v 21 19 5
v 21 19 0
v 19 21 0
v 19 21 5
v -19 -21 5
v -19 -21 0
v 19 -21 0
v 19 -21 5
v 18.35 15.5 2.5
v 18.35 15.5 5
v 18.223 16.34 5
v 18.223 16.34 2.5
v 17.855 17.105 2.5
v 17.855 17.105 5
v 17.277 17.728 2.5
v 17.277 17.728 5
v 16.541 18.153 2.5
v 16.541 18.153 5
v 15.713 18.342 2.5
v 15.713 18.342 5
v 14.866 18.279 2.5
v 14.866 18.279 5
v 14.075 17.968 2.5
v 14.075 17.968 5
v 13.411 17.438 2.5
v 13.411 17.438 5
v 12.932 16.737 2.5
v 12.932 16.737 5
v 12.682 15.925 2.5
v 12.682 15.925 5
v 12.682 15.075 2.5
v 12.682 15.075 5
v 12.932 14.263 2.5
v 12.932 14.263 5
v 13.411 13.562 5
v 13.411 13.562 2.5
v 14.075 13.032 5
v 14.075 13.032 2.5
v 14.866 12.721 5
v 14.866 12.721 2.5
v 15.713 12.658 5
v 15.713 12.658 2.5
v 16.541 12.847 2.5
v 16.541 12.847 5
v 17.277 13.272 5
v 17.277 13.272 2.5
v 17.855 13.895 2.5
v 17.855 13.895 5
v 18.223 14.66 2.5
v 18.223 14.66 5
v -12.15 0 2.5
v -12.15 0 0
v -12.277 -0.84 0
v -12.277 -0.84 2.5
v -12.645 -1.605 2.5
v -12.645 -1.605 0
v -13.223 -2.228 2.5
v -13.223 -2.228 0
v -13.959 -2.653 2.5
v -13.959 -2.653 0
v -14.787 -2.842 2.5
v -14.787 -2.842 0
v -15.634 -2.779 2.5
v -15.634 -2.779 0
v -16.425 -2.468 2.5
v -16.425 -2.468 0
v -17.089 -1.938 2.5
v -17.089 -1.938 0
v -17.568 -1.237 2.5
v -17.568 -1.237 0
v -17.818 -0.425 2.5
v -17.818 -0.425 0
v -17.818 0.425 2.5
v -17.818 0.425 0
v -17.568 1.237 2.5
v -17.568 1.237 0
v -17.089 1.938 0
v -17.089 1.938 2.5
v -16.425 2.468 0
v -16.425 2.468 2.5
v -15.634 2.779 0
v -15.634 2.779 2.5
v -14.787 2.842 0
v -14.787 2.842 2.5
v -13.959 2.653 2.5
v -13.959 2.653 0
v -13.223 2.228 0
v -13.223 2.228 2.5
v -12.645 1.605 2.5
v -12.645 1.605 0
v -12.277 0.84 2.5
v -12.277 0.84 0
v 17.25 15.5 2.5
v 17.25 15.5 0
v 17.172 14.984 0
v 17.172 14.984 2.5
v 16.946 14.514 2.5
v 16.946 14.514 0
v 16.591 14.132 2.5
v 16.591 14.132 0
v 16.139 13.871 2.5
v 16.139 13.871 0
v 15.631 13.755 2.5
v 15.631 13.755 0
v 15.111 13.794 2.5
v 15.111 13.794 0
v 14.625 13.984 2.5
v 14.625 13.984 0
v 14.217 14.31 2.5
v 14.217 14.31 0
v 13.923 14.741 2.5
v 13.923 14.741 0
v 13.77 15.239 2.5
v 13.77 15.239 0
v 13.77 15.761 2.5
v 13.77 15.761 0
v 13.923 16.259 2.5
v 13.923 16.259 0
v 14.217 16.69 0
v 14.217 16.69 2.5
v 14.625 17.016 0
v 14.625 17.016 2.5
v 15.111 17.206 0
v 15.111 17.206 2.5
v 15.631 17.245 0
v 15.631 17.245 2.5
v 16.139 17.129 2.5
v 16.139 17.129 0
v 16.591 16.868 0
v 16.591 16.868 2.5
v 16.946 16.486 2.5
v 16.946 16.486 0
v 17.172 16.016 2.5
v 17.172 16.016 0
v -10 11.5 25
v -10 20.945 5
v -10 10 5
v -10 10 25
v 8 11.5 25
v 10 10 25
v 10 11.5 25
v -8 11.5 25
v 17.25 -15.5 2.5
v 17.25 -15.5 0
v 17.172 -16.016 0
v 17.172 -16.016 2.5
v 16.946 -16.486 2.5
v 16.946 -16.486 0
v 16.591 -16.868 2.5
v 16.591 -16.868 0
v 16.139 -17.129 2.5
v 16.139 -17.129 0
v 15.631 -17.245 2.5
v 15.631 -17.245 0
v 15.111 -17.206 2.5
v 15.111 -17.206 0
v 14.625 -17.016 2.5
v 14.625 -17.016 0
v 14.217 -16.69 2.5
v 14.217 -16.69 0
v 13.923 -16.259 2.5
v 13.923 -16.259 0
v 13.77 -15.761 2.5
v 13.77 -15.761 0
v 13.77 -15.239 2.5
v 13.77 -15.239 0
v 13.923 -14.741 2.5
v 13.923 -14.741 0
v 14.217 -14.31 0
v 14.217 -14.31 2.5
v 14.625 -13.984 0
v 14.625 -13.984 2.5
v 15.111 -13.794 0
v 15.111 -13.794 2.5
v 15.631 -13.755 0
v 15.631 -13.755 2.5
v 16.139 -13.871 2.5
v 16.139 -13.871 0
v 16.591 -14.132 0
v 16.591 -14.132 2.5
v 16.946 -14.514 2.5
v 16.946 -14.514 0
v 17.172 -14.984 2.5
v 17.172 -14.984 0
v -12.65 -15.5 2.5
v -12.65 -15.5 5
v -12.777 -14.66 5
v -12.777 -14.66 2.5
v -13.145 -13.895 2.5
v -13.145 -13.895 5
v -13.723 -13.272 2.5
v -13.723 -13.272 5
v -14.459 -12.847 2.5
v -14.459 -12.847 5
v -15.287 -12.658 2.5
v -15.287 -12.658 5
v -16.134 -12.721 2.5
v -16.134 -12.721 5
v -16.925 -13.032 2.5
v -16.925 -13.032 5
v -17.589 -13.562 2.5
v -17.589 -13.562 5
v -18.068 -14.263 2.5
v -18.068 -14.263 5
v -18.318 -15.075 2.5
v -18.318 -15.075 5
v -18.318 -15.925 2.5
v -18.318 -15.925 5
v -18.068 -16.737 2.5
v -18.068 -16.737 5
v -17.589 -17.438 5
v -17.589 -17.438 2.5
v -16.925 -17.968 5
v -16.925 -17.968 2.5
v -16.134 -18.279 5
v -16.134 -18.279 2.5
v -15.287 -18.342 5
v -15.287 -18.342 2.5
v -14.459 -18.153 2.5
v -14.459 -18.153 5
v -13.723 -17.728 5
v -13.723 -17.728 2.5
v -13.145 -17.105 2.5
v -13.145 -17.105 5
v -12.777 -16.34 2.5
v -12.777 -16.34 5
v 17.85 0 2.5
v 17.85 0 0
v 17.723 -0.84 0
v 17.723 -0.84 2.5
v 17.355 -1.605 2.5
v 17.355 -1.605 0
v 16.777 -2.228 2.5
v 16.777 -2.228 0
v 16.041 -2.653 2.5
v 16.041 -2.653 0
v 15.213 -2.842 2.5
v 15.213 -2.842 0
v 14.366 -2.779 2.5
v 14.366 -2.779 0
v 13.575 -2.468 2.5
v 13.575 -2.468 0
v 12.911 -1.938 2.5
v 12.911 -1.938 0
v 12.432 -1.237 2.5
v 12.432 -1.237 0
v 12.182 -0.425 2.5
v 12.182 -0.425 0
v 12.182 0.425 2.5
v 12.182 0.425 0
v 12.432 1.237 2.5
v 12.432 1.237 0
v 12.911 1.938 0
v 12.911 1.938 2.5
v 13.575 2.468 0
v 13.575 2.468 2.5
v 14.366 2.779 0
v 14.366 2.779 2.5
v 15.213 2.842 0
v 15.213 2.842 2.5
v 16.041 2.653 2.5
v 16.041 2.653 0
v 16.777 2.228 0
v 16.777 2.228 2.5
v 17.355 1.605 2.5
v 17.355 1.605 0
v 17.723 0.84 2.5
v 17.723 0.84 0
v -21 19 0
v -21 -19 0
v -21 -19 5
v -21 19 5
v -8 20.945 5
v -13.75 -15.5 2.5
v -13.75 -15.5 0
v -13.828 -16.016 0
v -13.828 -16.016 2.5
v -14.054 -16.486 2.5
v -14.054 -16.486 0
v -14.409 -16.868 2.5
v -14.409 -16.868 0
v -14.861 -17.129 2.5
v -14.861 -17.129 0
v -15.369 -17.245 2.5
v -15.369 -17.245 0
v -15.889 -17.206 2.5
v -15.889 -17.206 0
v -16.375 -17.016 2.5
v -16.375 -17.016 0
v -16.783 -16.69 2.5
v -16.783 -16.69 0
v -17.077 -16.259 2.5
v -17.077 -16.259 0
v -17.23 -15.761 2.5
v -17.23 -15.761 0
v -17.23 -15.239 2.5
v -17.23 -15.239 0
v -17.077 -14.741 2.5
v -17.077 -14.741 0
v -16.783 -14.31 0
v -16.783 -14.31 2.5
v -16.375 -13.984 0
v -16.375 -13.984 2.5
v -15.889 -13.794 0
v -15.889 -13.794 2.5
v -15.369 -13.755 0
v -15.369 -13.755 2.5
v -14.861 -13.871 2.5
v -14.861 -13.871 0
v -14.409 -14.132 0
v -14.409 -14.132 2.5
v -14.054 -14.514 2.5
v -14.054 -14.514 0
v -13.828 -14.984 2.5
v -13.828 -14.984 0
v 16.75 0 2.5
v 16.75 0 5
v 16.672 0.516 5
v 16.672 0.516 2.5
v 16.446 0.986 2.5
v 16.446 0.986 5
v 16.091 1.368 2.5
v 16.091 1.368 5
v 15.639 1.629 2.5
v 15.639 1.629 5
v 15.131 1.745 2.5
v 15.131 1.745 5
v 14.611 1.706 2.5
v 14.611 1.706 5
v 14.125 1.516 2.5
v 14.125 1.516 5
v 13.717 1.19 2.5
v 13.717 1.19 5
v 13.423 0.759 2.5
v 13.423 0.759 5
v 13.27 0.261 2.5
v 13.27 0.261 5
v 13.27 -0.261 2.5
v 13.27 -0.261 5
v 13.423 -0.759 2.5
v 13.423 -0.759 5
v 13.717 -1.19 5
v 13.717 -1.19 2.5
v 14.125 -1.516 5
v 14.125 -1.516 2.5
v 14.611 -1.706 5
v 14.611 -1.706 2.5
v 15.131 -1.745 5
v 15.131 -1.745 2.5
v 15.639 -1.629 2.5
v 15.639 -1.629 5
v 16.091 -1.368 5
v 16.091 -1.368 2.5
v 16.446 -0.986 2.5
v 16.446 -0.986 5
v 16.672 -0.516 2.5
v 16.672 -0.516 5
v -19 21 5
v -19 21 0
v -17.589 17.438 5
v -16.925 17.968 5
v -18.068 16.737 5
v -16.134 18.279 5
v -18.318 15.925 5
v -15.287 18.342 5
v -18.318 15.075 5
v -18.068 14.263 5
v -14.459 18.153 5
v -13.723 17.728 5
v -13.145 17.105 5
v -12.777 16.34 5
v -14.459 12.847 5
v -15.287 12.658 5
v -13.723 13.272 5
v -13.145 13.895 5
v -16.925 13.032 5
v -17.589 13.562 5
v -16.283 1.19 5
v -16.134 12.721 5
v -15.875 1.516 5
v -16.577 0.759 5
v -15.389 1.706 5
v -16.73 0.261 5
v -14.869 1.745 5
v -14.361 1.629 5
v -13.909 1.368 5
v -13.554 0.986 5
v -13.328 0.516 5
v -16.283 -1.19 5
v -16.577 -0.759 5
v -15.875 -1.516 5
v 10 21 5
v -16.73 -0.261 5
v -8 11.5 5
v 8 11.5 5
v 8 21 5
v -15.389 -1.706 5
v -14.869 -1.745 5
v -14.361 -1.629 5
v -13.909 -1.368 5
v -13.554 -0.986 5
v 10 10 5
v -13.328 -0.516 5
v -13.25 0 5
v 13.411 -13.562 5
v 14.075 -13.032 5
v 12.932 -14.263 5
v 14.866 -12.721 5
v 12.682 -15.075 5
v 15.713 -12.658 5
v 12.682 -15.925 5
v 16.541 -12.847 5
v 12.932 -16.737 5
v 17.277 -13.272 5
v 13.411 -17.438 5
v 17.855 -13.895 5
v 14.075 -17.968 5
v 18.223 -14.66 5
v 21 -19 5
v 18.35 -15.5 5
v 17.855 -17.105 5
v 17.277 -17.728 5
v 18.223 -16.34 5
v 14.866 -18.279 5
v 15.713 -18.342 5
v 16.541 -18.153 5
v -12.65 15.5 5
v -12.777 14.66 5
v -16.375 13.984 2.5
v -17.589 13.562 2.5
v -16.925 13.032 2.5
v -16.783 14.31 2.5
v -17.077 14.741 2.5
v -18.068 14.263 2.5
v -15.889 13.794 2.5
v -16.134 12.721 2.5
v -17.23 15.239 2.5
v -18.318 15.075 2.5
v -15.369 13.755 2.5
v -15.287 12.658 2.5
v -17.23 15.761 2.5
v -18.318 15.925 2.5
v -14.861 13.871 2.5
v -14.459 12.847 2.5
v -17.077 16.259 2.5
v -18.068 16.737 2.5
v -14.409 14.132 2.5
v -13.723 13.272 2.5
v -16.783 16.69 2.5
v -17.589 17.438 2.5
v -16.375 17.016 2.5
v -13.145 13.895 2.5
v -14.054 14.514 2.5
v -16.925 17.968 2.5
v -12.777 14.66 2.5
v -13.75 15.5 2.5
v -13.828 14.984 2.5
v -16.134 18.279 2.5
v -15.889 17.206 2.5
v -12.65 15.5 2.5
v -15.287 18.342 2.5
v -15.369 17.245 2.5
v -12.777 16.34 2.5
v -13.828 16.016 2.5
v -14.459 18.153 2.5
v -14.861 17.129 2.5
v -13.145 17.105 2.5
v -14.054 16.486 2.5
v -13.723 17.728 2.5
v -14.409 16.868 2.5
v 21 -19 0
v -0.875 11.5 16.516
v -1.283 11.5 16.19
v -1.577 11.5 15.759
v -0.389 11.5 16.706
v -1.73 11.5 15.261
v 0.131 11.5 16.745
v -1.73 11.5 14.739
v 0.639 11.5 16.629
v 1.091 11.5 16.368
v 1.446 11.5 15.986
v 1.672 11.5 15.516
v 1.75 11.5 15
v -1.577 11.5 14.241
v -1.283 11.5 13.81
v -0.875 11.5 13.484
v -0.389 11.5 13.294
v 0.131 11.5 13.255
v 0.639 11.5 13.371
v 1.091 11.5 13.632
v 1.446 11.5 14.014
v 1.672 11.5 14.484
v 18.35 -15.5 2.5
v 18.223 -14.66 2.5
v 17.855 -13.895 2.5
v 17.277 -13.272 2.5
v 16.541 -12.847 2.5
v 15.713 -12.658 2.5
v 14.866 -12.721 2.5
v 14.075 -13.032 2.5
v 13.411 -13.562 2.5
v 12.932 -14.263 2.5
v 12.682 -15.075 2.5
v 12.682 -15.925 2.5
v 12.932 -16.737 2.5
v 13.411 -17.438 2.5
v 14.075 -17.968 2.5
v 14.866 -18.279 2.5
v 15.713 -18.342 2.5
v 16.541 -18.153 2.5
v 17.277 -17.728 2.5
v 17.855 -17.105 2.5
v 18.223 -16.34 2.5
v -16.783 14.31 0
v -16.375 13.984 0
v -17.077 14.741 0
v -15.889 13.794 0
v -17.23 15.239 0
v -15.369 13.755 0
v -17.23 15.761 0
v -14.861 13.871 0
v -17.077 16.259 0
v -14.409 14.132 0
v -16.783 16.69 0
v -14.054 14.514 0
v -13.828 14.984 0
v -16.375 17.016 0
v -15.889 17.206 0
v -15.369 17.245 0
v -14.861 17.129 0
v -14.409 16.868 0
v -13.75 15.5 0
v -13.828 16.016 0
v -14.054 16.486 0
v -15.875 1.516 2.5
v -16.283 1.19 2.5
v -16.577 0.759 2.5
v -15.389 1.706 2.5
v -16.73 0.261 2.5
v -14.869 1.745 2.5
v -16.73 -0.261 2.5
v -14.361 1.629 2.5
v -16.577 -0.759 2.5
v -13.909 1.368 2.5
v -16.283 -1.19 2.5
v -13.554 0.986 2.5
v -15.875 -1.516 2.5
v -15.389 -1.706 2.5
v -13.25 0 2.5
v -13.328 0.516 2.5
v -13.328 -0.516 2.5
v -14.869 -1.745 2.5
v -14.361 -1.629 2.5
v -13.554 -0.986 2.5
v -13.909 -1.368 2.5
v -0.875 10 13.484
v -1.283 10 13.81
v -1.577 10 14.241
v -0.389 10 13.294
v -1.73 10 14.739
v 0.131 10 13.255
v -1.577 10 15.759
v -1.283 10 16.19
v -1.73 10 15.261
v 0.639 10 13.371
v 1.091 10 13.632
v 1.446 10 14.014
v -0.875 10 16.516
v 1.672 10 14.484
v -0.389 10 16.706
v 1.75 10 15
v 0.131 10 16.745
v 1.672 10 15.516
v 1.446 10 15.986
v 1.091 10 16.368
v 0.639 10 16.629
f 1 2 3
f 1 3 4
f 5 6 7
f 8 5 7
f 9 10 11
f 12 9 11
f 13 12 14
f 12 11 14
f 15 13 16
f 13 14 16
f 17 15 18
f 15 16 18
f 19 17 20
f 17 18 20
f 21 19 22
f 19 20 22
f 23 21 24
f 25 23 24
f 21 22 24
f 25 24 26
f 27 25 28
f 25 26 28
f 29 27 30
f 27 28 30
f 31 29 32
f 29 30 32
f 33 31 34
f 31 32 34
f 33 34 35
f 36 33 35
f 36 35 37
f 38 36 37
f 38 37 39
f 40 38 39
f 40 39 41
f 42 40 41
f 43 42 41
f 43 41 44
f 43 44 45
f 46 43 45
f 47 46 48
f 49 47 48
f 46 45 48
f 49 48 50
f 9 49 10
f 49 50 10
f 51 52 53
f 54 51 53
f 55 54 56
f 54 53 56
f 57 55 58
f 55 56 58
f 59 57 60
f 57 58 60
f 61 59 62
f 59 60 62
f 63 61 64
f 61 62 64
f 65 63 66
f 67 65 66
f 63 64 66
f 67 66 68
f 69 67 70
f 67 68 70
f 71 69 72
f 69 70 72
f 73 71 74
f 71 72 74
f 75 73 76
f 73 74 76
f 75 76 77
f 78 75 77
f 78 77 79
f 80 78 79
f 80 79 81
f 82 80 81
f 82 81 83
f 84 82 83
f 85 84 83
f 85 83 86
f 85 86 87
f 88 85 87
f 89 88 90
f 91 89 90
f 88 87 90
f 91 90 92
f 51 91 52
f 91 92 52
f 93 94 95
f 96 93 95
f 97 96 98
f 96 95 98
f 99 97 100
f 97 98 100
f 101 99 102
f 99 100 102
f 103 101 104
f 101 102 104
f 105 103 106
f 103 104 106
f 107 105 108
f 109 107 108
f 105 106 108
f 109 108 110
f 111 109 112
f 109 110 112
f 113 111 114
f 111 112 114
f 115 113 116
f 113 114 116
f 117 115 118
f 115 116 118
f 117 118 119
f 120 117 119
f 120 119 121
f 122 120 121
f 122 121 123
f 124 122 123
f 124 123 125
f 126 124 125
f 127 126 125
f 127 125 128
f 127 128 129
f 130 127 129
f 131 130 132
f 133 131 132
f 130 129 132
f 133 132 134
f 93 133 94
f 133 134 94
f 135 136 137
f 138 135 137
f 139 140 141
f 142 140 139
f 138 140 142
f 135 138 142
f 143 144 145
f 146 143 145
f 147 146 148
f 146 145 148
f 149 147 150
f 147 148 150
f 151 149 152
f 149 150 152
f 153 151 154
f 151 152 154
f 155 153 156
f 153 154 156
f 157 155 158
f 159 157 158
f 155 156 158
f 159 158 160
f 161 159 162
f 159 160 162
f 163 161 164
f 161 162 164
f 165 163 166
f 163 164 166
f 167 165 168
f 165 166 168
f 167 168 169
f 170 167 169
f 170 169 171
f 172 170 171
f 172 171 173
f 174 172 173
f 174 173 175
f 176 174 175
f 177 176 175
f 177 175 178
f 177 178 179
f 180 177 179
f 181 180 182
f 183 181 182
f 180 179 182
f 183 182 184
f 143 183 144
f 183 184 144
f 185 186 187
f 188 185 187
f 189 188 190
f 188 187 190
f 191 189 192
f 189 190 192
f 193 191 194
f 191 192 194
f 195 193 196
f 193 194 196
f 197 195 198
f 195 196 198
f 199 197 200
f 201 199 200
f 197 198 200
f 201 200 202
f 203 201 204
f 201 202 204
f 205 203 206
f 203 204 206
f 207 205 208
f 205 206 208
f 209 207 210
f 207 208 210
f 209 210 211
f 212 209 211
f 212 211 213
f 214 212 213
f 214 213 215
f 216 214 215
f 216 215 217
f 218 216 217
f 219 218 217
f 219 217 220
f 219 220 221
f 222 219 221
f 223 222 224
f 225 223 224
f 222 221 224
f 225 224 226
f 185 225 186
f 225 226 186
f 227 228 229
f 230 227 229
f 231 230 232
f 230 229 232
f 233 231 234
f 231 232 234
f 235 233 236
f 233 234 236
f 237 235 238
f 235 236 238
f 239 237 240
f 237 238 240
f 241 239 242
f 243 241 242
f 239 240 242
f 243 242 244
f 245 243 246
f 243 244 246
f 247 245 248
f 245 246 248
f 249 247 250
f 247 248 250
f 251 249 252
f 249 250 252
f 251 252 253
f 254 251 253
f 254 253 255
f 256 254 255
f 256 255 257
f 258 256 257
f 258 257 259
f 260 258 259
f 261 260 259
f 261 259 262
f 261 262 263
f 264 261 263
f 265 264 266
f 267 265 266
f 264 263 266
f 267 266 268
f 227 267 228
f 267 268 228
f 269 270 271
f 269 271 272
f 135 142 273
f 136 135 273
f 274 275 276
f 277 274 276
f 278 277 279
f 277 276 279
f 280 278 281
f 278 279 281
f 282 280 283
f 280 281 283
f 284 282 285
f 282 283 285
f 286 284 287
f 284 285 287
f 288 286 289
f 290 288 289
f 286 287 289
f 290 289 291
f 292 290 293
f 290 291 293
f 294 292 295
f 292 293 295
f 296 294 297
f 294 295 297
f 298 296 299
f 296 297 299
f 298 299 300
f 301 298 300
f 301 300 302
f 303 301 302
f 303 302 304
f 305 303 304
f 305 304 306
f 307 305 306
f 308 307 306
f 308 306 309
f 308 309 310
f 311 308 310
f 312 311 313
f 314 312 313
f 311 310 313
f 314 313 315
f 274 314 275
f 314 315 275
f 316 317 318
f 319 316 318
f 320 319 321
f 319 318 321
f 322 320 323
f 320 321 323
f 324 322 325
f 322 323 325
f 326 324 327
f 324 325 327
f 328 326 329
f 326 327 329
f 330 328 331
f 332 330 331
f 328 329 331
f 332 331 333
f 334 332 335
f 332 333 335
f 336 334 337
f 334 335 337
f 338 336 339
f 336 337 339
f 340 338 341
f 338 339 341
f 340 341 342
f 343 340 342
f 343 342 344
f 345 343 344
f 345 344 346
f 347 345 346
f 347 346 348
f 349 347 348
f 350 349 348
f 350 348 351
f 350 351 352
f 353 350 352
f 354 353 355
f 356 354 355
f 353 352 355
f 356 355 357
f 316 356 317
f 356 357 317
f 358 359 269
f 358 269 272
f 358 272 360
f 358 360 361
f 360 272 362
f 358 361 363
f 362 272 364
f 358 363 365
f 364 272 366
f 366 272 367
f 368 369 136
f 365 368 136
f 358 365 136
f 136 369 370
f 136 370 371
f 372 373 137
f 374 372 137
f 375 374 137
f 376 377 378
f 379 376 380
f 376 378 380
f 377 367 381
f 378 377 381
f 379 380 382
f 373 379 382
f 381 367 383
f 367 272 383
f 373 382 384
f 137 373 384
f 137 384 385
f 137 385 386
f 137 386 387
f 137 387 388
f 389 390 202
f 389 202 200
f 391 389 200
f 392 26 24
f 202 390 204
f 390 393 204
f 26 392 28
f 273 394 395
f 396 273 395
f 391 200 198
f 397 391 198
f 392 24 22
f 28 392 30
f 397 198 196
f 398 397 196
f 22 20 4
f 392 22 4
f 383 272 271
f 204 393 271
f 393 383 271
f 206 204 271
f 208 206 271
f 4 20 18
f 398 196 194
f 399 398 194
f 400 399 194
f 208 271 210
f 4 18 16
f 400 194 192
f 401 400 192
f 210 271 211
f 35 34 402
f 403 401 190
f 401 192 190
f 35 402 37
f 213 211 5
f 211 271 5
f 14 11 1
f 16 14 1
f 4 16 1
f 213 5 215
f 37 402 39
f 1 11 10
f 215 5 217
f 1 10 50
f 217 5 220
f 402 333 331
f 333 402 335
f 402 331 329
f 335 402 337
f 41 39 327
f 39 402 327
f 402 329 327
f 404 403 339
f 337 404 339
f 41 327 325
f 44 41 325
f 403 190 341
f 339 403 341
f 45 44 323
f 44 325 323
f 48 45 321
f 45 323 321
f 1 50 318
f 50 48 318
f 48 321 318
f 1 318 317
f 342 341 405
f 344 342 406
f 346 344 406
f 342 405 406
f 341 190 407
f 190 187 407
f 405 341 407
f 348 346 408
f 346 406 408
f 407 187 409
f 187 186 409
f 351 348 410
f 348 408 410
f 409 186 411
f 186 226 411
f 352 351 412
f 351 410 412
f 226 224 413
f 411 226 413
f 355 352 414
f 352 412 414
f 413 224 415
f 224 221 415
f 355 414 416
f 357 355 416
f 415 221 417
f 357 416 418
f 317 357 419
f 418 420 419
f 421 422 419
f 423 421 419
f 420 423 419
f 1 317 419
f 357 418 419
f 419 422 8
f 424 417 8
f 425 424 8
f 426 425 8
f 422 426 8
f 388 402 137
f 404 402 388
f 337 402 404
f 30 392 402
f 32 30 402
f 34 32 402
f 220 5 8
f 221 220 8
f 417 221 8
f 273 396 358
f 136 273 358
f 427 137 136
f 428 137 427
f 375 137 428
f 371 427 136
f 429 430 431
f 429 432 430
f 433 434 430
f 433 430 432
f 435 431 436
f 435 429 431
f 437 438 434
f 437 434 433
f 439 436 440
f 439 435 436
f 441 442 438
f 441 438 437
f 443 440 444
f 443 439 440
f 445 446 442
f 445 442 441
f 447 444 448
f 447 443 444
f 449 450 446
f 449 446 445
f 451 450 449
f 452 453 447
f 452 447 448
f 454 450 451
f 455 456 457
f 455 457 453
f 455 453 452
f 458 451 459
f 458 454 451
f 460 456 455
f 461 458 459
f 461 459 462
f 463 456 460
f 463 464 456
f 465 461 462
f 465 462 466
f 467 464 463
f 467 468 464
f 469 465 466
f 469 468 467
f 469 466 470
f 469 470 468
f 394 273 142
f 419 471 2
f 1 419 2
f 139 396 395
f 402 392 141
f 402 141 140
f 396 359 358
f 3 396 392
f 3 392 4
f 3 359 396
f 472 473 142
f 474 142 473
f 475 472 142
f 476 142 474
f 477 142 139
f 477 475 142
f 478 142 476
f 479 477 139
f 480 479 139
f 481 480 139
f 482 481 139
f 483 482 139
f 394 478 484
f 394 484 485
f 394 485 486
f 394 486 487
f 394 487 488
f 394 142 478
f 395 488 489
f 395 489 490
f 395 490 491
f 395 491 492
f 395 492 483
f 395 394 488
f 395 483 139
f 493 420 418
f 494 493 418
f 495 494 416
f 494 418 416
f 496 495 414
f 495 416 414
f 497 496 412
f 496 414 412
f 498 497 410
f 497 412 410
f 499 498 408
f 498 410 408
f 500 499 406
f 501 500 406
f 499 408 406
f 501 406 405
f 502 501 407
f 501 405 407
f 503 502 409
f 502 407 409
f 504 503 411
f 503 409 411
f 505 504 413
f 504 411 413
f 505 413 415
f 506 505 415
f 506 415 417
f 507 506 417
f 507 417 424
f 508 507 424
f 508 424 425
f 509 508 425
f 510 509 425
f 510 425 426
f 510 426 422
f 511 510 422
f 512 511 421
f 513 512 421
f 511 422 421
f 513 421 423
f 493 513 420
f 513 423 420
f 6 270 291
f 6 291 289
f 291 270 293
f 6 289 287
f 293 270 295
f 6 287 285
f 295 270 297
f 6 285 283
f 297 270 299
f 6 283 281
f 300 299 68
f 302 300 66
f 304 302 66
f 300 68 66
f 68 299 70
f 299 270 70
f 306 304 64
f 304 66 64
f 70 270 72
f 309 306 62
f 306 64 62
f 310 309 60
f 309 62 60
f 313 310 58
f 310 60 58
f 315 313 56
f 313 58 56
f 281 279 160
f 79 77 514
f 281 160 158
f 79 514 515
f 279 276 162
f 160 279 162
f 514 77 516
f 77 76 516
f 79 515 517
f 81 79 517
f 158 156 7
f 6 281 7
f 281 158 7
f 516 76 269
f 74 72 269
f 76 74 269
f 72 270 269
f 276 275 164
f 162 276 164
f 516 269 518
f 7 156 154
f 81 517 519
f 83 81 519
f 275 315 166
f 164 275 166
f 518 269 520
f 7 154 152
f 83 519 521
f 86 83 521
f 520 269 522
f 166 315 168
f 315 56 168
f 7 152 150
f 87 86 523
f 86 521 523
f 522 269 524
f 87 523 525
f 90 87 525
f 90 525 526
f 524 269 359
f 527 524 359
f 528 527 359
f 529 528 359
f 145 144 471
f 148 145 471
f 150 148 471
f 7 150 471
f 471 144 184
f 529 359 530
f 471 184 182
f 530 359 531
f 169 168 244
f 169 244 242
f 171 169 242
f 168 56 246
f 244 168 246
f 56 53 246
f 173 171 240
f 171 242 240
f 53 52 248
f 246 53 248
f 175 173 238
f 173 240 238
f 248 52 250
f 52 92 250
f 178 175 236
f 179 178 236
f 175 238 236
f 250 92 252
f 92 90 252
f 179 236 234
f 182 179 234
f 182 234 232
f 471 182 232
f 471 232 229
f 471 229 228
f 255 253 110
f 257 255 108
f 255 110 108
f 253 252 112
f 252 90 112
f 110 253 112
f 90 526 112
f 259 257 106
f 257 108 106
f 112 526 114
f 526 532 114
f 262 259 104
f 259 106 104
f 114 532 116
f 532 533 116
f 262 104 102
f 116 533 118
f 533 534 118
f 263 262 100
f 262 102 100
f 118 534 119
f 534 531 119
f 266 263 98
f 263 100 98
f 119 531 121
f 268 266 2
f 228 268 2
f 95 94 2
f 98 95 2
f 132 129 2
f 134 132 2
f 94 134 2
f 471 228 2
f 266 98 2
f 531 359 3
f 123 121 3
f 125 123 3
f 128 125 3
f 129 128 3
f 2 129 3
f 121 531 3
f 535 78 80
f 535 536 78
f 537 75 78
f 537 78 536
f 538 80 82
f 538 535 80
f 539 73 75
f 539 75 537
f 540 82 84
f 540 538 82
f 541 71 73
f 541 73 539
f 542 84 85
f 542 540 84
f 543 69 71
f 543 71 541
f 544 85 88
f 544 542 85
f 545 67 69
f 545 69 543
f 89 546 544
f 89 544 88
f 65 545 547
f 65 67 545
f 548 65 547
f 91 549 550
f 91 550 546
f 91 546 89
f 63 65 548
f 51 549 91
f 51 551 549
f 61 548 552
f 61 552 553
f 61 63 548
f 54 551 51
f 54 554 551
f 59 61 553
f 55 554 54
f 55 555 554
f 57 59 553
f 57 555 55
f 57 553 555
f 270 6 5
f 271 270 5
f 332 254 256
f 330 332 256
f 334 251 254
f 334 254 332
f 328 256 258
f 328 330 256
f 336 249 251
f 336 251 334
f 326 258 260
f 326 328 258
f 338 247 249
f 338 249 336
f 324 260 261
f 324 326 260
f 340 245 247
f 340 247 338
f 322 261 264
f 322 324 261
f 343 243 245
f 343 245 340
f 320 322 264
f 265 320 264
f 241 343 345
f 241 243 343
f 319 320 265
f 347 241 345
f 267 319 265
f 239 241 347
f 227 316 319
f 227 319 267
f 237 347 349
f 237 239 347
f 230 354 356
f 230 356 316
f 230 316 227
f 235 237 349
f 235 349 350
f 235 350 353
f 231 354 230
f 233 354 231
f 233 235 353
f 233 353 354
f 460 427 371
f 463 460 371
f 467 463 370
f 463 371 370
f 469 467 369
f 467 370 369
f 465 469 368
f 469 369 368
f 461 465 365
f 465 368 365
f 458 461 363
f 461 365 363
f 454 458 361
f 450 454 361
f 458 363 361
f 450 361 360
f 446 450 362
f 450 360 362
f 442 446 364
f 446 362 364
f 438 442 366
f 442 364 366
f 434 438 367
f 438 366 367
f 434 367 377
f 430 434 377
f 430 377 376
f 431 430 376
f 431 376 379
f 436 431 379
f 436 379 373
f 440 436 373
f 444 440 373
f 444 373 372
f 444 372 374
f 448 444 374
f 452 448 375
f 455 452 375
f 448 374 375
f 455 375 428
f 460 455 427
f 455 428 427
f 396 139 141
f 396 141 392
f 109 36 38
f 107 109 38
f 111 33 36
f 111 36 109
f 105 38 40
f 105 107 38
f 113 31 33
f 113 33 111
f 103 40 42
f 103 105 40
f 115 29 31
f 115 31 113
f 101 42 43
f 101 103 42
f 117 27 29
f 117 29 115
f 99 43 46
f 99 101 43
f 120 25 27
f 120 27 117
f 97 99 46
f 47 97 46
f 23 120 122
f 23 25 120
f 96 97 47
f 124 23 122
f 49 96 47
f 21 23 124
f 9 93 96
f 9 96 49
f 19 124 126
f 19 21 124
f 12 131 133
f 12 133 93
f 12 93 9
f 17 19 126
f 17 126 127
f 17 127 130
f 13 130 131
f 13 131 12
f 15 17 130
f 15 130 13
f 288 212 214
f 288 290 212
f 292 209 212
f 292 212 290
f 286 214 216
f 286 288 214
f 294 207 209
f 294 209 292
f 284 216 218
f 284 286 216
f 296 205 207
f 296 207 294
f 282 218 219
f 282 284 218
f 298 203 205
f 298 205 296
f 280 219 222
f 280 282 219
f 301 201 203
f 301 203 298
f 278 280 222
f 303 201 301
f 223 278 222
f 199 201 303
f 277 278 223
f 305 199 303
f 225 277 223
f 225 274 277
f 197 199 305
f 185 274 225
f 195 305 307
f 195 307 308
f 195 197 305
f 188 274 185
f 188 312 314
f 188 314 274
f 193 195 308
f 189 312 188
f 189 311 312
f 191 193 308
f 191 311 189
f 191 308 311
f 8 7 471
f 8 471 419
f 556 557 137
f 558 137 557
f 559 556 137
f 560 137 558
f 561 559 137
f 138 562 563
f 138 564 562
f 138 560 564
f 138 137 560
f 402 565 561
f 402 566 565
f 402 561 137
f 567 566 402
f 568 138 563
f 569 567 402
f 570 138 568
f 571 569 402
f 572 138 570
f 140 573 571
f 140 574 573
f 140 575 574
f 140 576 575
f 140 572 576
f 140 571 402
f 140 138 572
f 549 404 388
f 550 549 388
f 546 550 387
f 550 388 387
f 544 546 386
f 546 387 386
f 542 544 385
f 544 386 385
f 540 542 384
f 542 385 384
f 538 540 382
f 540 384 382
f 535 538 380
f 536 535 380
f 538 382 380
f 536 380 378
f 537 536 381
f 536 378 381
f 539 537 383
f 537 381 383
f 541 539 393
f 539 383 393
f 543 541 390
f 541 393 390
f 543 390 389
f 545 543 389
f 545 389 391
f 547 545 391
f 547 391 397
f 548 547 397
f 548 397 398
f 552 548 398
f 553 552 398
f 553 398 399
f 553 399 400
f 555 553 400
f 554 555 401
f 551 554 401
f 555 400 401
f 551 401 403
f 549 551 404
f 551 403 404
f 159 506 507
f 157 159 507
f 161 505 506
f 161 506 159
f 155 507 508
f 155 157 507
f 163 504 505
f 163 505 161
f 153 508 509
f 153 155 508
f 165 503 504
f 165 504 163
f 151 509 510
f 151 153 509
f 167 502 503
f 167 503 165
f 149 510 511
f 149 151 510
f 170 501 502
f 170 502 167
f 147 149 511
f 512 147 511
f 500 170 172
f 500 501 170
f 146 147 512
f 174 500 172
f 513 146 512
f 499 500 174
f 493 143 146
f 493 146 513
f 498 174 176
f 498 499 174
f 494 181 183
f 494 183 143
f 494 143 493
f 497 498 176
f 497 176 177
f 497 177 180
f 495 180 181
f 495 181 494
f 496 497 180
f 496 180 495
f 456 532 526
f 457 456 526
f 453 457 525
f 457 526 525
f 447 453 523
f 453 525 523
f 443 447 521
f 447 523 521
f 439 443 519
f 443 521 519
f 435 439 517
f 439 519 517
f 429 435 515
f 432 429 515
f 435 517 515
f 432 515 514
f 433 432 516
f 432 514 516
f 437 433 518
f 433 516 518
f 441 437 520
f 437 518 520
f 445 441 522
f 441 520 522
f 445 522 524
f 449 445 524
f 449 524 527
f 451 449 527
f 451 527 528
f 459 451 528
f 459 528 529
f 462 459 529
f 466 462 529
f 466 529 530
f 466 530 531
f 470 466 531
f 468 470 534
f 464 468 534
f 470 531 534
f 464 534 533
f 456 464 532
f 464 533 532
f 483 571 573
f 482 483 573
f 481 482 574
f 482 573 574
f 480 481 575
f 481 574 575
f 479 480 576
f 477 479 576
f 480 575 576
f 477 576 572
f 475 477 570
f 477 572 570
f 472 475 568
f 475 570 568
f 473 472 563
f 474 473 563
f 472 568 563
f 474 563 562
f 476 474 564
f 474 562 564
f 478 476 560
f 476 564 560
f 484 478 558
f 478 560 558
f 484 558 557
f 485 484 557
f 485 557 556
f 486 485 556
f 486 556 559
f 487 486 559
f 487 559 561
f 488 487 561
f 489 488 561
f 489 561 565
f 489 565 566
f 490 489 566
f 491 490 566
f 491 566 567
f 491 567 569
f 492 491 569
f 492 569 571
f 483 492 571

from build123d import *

# Parameters (mm, degrees)
BOX_W           = 42
BOX_H           = 42
BOX_DEPTH       = 5
SKETCH_R        = 2.75
POCKET_DEPTH    = 2.5
SKETCH001_R     = 1.55
POCKET001_DEPTH = 5
SKETCH002_R     = 2.75
POCKET002_DEPTH = 2.5
SKETCH003_R     = 1.55
POCKET003_DEPTH = 5
CHAMFER_SIZE    = 2
CHAMFER001_SIZE = 2
CHAMFER002_SIZE = 2
CHAMFER003_SIZE = 2
SKETCH004_W     = 16
SKETCH004_H     = 2.5
PAD_DEPTH       = 20
PAD001_DEPTH    = 2
PAD002_DEPTH    = 2
SKETCH007_R     = 1.55
POCKET004_DEPTH = 5
SKETCH008_W     = 20
SKETCH008_H     = 20
POCKET005_DEPTH = 1
SKETCH010_R     = 2.85
SKETCH010_R_2   = 1.75
POCKET006_DEPTH = 2.5
SKETCH011_R     = 1.75
SKETCH011_R_2   = 2.85
POCKET007_DEPTH = 2.5
SKETCH012_R     = 1.75
POCKET008_DEPTH = 5


with BuildPart() as part:
    # Box → Box (new body)
    with BuildSketch(Plane(origin=(-21, -21, 0), x_dir=(1, 0, 0), z_dir=(0, 0, 1))):
        with Locations((21, 21)):
            Rectangle(BOX_W, BOX_H)
    extrude(amount=BOX_DEPTH)

    # Sketch → Pocket (cut)
    with BuildSketch(Plane(origin=(-21, -21, 5), x_dir=(1, 0, 0), z_dir=(0, 0, 1))):
        with Locations((5.5, 5.5)):
            Circle(SKETCH_R)
        with Locations((36.5, 5.5)):
            Circle(SKETCH_R)
        with Locations((36.5, 36.5)):
            Circle(SKETCH_R)
        with Locations((5.5, 36.5)):
            Circle(SKETCH_R)
    extrude(amount=-POCKET_DEPTH, mode=Mode.SUBTRACT)

    # Sketch001 → Pocket001 (cut)
    with BuildSketch(Plane(origin=(-21, -21, 0), x_dir=(1, 0, 0), z_dir=(0, 0, -1))):
        with Locations((5.5, -5.5)):
            Circle(SKETCH001_R)
        with Locations((36.5, -5.5)):
            Circle(SKETCH001_R)
        with Locations((36.5, -36.5)):
            Circle(SKETCH001_R)
        with Locations((5.5, -36.5)):
            Circle(SKETCH001_R)
    extrude(amount=-POCKET001_DEPTH, mode=Mode.SUBTRACT)

    # Sketch002 → Pocket002 (cut)
    with BuildSketch(Plane(origin=(-21, -21, 0), x_dir=(1, 0, 0), z_dir=(0, 0, -1))):
        with Locations((6, -21)):
            Circle(SKETCH002_R)
        with Locations((36, -21)):
            Circle(SKETCH002_R)
    extrude(amount=-POCKET002_DEPTH, mode=Mode.SUBTRACT)

    # Sketch003 → Pocket003 (cut)
    with BuildSketch(Plane(origin=(-21, -21, 5), x_dir=(1, 0, 0), z_dir=(0, 0, 1))):
        with Locations((6, 21)):
            Circle(SKETCH003_R)
        with Locations((36, 21)):
            Circle(SKETCH003_R)
    extrude(amount=-POCKET003_DEPTH, mode=Mode.SUBTRACT)

    # Chamfer
    chamfer_edges = [part.edges().sort_by_distance(p)[0] for p in [
        (-21, -21, 2.5),
    ]]
    chamfer(chamfer_edges, length=CHAMFER_SIZE)

    # Chamfer001
    chamfer001_edges = [part.edges().sort_by_distance(p)[0] for p in [
        (-21, 21, 2.5),
    ]]
    chamfer(chamfer001_edges, length=CHAMFER001_SIZE)

    # Chamfer002
    chamfer002_edges = [part.edges().sort_by_distance(p)[0] for p in [
        (21, 21, 2.5),
    ]]
    chamfer(chamfer002_edges, length=CHAMFER002_SIZE)

    # Chamfer003
    chamfer003_edges = [part.edges().sort_by_distance(p)[0] for p in [
        (21, -21, 2.5),
    ]]
    chamfer(chamfer003_edges, length=CHAMFER003_SIZE)

    # Sketch004 → Pad (new body)
    with BuildSketch(Plane(origin=(-21, -21, 5), x_dir=(1, 0, 0), z_dir=(0, 0, 1))):
        with Locations((21, 31.25)):
            Rectangle(SKETCH004_W, SKETCH004_H)
    extrude(amount=PAD_DEPTH)

    # Sketch005 → Pad001 (new body)
    with BuildSketch(Plane(origin=(-8, -21, 0), x_dir=(0, -1, 0), z_dir=(-1, 0, 0))):
        Polygon((-30, 25), (-32.5, 25), (-41.94515, 5), (-30, 5), align=None)
    extrude(amount=PAD001_DEPTH)

    # Sketch006 → Pad002 (new body)
    with BuildSketch(Plane(origin=(8, -21, 0), x_dir=(0, 1, 0), z_dir=(1, 0, 0))):
        Polygon((30, 25), (32.5, 25), (42, 5), (30, 5), align=None)
    extrude(amount=PAD002_DEPTH)

    # Sketch007 → Pocket004 (cut)
    with BuildSketch(Plane(origin=(-21, 11.5, 0), x_dir=(-1, 0, 0), z_dir=(0, 1, 0))):
        with Locations((-21, 15)):
            Circle(SKETCH007_R)
    extrude(amount=-POCKET004_DEPTH, mode=Mode.SUBTRACT)

    # Sketch008 → Pocket005 (cut)
    with BuildSketch(Plane(origin=(-21, 9, 0), x_dir=(1, 0, 0), z_dir=(0, -1, 0))):
        with Locations((21, 15)):
            Rectangle(SKETCH008_W, SKETCH008_H)
    extrude(amount=-POCKET005_DEPTH, mode=Mode.SUBTRACT)

    # Sketch010 → Pocket006 (cut)
    with BuildSketch(Plane(origin=(-21, -21, 5), x_dir=(1, 0, 0), z_dir=(0, 0, 1))):
        with Locations((5.5, 36.5)):
            Circle(SKETCH010_R)
        with Locations((5.5, 5.5)):
            Circle(SKETCH010_R)
        with Locations((36.5, 5.5)):
            Circle(SKETCH010_R)
        with Locations((36, 21)):
            Circle(SKETCH010_R_2)
        with Locations((36.5, 36.5)):
            Circle(SKETCH010_R)
        with Locations((6, 21)):
            Circle(SKETCH010_R_2)
    extrude(amount=-POCKET006_DEPTH, mode=Mode.SUBTRACT)

    # Sketch011 → Pocket007 (cut)
    with BuildSketch(Plane(origin=(-21, -21, 0), x_dir=(1, 0, 0), z_dir=(0, 0, -1))):
        with Locations((5.5, -5.5)):
            Circle(SKETCH011_R)
        with Locations((36.5, -5.5)):
            Circle(SKETCH011_R)
        with Locations((6, -21)):
            Circle(SKETCH011_R_2)
        with Locations((36, -21)):
            Circle(SKETCH011_R_2)
        with Locations((36.5, -36.5)):
            Circle(SKETCH011_R)
        with Locations((5.5, -36.5)):
            Circle(SKETCH011_R)
    extrude(amount=-POCKET007_DEPTH, mode=Mode.SUBTRACT)

    # Sketch012 → Pocket008 (cut)
    with BuildSketch(Plane(origin=(-21, 10, 0), x_dir=(1, 0, 0), z_dir=(0, -1, 0))):
        with Locations((21, 15)):
            Circle(SKETCH012_R)
    extrude(amount=-POCKET008_DEPTH, mode=Mode.SUBTRACT)


solid = part.part
